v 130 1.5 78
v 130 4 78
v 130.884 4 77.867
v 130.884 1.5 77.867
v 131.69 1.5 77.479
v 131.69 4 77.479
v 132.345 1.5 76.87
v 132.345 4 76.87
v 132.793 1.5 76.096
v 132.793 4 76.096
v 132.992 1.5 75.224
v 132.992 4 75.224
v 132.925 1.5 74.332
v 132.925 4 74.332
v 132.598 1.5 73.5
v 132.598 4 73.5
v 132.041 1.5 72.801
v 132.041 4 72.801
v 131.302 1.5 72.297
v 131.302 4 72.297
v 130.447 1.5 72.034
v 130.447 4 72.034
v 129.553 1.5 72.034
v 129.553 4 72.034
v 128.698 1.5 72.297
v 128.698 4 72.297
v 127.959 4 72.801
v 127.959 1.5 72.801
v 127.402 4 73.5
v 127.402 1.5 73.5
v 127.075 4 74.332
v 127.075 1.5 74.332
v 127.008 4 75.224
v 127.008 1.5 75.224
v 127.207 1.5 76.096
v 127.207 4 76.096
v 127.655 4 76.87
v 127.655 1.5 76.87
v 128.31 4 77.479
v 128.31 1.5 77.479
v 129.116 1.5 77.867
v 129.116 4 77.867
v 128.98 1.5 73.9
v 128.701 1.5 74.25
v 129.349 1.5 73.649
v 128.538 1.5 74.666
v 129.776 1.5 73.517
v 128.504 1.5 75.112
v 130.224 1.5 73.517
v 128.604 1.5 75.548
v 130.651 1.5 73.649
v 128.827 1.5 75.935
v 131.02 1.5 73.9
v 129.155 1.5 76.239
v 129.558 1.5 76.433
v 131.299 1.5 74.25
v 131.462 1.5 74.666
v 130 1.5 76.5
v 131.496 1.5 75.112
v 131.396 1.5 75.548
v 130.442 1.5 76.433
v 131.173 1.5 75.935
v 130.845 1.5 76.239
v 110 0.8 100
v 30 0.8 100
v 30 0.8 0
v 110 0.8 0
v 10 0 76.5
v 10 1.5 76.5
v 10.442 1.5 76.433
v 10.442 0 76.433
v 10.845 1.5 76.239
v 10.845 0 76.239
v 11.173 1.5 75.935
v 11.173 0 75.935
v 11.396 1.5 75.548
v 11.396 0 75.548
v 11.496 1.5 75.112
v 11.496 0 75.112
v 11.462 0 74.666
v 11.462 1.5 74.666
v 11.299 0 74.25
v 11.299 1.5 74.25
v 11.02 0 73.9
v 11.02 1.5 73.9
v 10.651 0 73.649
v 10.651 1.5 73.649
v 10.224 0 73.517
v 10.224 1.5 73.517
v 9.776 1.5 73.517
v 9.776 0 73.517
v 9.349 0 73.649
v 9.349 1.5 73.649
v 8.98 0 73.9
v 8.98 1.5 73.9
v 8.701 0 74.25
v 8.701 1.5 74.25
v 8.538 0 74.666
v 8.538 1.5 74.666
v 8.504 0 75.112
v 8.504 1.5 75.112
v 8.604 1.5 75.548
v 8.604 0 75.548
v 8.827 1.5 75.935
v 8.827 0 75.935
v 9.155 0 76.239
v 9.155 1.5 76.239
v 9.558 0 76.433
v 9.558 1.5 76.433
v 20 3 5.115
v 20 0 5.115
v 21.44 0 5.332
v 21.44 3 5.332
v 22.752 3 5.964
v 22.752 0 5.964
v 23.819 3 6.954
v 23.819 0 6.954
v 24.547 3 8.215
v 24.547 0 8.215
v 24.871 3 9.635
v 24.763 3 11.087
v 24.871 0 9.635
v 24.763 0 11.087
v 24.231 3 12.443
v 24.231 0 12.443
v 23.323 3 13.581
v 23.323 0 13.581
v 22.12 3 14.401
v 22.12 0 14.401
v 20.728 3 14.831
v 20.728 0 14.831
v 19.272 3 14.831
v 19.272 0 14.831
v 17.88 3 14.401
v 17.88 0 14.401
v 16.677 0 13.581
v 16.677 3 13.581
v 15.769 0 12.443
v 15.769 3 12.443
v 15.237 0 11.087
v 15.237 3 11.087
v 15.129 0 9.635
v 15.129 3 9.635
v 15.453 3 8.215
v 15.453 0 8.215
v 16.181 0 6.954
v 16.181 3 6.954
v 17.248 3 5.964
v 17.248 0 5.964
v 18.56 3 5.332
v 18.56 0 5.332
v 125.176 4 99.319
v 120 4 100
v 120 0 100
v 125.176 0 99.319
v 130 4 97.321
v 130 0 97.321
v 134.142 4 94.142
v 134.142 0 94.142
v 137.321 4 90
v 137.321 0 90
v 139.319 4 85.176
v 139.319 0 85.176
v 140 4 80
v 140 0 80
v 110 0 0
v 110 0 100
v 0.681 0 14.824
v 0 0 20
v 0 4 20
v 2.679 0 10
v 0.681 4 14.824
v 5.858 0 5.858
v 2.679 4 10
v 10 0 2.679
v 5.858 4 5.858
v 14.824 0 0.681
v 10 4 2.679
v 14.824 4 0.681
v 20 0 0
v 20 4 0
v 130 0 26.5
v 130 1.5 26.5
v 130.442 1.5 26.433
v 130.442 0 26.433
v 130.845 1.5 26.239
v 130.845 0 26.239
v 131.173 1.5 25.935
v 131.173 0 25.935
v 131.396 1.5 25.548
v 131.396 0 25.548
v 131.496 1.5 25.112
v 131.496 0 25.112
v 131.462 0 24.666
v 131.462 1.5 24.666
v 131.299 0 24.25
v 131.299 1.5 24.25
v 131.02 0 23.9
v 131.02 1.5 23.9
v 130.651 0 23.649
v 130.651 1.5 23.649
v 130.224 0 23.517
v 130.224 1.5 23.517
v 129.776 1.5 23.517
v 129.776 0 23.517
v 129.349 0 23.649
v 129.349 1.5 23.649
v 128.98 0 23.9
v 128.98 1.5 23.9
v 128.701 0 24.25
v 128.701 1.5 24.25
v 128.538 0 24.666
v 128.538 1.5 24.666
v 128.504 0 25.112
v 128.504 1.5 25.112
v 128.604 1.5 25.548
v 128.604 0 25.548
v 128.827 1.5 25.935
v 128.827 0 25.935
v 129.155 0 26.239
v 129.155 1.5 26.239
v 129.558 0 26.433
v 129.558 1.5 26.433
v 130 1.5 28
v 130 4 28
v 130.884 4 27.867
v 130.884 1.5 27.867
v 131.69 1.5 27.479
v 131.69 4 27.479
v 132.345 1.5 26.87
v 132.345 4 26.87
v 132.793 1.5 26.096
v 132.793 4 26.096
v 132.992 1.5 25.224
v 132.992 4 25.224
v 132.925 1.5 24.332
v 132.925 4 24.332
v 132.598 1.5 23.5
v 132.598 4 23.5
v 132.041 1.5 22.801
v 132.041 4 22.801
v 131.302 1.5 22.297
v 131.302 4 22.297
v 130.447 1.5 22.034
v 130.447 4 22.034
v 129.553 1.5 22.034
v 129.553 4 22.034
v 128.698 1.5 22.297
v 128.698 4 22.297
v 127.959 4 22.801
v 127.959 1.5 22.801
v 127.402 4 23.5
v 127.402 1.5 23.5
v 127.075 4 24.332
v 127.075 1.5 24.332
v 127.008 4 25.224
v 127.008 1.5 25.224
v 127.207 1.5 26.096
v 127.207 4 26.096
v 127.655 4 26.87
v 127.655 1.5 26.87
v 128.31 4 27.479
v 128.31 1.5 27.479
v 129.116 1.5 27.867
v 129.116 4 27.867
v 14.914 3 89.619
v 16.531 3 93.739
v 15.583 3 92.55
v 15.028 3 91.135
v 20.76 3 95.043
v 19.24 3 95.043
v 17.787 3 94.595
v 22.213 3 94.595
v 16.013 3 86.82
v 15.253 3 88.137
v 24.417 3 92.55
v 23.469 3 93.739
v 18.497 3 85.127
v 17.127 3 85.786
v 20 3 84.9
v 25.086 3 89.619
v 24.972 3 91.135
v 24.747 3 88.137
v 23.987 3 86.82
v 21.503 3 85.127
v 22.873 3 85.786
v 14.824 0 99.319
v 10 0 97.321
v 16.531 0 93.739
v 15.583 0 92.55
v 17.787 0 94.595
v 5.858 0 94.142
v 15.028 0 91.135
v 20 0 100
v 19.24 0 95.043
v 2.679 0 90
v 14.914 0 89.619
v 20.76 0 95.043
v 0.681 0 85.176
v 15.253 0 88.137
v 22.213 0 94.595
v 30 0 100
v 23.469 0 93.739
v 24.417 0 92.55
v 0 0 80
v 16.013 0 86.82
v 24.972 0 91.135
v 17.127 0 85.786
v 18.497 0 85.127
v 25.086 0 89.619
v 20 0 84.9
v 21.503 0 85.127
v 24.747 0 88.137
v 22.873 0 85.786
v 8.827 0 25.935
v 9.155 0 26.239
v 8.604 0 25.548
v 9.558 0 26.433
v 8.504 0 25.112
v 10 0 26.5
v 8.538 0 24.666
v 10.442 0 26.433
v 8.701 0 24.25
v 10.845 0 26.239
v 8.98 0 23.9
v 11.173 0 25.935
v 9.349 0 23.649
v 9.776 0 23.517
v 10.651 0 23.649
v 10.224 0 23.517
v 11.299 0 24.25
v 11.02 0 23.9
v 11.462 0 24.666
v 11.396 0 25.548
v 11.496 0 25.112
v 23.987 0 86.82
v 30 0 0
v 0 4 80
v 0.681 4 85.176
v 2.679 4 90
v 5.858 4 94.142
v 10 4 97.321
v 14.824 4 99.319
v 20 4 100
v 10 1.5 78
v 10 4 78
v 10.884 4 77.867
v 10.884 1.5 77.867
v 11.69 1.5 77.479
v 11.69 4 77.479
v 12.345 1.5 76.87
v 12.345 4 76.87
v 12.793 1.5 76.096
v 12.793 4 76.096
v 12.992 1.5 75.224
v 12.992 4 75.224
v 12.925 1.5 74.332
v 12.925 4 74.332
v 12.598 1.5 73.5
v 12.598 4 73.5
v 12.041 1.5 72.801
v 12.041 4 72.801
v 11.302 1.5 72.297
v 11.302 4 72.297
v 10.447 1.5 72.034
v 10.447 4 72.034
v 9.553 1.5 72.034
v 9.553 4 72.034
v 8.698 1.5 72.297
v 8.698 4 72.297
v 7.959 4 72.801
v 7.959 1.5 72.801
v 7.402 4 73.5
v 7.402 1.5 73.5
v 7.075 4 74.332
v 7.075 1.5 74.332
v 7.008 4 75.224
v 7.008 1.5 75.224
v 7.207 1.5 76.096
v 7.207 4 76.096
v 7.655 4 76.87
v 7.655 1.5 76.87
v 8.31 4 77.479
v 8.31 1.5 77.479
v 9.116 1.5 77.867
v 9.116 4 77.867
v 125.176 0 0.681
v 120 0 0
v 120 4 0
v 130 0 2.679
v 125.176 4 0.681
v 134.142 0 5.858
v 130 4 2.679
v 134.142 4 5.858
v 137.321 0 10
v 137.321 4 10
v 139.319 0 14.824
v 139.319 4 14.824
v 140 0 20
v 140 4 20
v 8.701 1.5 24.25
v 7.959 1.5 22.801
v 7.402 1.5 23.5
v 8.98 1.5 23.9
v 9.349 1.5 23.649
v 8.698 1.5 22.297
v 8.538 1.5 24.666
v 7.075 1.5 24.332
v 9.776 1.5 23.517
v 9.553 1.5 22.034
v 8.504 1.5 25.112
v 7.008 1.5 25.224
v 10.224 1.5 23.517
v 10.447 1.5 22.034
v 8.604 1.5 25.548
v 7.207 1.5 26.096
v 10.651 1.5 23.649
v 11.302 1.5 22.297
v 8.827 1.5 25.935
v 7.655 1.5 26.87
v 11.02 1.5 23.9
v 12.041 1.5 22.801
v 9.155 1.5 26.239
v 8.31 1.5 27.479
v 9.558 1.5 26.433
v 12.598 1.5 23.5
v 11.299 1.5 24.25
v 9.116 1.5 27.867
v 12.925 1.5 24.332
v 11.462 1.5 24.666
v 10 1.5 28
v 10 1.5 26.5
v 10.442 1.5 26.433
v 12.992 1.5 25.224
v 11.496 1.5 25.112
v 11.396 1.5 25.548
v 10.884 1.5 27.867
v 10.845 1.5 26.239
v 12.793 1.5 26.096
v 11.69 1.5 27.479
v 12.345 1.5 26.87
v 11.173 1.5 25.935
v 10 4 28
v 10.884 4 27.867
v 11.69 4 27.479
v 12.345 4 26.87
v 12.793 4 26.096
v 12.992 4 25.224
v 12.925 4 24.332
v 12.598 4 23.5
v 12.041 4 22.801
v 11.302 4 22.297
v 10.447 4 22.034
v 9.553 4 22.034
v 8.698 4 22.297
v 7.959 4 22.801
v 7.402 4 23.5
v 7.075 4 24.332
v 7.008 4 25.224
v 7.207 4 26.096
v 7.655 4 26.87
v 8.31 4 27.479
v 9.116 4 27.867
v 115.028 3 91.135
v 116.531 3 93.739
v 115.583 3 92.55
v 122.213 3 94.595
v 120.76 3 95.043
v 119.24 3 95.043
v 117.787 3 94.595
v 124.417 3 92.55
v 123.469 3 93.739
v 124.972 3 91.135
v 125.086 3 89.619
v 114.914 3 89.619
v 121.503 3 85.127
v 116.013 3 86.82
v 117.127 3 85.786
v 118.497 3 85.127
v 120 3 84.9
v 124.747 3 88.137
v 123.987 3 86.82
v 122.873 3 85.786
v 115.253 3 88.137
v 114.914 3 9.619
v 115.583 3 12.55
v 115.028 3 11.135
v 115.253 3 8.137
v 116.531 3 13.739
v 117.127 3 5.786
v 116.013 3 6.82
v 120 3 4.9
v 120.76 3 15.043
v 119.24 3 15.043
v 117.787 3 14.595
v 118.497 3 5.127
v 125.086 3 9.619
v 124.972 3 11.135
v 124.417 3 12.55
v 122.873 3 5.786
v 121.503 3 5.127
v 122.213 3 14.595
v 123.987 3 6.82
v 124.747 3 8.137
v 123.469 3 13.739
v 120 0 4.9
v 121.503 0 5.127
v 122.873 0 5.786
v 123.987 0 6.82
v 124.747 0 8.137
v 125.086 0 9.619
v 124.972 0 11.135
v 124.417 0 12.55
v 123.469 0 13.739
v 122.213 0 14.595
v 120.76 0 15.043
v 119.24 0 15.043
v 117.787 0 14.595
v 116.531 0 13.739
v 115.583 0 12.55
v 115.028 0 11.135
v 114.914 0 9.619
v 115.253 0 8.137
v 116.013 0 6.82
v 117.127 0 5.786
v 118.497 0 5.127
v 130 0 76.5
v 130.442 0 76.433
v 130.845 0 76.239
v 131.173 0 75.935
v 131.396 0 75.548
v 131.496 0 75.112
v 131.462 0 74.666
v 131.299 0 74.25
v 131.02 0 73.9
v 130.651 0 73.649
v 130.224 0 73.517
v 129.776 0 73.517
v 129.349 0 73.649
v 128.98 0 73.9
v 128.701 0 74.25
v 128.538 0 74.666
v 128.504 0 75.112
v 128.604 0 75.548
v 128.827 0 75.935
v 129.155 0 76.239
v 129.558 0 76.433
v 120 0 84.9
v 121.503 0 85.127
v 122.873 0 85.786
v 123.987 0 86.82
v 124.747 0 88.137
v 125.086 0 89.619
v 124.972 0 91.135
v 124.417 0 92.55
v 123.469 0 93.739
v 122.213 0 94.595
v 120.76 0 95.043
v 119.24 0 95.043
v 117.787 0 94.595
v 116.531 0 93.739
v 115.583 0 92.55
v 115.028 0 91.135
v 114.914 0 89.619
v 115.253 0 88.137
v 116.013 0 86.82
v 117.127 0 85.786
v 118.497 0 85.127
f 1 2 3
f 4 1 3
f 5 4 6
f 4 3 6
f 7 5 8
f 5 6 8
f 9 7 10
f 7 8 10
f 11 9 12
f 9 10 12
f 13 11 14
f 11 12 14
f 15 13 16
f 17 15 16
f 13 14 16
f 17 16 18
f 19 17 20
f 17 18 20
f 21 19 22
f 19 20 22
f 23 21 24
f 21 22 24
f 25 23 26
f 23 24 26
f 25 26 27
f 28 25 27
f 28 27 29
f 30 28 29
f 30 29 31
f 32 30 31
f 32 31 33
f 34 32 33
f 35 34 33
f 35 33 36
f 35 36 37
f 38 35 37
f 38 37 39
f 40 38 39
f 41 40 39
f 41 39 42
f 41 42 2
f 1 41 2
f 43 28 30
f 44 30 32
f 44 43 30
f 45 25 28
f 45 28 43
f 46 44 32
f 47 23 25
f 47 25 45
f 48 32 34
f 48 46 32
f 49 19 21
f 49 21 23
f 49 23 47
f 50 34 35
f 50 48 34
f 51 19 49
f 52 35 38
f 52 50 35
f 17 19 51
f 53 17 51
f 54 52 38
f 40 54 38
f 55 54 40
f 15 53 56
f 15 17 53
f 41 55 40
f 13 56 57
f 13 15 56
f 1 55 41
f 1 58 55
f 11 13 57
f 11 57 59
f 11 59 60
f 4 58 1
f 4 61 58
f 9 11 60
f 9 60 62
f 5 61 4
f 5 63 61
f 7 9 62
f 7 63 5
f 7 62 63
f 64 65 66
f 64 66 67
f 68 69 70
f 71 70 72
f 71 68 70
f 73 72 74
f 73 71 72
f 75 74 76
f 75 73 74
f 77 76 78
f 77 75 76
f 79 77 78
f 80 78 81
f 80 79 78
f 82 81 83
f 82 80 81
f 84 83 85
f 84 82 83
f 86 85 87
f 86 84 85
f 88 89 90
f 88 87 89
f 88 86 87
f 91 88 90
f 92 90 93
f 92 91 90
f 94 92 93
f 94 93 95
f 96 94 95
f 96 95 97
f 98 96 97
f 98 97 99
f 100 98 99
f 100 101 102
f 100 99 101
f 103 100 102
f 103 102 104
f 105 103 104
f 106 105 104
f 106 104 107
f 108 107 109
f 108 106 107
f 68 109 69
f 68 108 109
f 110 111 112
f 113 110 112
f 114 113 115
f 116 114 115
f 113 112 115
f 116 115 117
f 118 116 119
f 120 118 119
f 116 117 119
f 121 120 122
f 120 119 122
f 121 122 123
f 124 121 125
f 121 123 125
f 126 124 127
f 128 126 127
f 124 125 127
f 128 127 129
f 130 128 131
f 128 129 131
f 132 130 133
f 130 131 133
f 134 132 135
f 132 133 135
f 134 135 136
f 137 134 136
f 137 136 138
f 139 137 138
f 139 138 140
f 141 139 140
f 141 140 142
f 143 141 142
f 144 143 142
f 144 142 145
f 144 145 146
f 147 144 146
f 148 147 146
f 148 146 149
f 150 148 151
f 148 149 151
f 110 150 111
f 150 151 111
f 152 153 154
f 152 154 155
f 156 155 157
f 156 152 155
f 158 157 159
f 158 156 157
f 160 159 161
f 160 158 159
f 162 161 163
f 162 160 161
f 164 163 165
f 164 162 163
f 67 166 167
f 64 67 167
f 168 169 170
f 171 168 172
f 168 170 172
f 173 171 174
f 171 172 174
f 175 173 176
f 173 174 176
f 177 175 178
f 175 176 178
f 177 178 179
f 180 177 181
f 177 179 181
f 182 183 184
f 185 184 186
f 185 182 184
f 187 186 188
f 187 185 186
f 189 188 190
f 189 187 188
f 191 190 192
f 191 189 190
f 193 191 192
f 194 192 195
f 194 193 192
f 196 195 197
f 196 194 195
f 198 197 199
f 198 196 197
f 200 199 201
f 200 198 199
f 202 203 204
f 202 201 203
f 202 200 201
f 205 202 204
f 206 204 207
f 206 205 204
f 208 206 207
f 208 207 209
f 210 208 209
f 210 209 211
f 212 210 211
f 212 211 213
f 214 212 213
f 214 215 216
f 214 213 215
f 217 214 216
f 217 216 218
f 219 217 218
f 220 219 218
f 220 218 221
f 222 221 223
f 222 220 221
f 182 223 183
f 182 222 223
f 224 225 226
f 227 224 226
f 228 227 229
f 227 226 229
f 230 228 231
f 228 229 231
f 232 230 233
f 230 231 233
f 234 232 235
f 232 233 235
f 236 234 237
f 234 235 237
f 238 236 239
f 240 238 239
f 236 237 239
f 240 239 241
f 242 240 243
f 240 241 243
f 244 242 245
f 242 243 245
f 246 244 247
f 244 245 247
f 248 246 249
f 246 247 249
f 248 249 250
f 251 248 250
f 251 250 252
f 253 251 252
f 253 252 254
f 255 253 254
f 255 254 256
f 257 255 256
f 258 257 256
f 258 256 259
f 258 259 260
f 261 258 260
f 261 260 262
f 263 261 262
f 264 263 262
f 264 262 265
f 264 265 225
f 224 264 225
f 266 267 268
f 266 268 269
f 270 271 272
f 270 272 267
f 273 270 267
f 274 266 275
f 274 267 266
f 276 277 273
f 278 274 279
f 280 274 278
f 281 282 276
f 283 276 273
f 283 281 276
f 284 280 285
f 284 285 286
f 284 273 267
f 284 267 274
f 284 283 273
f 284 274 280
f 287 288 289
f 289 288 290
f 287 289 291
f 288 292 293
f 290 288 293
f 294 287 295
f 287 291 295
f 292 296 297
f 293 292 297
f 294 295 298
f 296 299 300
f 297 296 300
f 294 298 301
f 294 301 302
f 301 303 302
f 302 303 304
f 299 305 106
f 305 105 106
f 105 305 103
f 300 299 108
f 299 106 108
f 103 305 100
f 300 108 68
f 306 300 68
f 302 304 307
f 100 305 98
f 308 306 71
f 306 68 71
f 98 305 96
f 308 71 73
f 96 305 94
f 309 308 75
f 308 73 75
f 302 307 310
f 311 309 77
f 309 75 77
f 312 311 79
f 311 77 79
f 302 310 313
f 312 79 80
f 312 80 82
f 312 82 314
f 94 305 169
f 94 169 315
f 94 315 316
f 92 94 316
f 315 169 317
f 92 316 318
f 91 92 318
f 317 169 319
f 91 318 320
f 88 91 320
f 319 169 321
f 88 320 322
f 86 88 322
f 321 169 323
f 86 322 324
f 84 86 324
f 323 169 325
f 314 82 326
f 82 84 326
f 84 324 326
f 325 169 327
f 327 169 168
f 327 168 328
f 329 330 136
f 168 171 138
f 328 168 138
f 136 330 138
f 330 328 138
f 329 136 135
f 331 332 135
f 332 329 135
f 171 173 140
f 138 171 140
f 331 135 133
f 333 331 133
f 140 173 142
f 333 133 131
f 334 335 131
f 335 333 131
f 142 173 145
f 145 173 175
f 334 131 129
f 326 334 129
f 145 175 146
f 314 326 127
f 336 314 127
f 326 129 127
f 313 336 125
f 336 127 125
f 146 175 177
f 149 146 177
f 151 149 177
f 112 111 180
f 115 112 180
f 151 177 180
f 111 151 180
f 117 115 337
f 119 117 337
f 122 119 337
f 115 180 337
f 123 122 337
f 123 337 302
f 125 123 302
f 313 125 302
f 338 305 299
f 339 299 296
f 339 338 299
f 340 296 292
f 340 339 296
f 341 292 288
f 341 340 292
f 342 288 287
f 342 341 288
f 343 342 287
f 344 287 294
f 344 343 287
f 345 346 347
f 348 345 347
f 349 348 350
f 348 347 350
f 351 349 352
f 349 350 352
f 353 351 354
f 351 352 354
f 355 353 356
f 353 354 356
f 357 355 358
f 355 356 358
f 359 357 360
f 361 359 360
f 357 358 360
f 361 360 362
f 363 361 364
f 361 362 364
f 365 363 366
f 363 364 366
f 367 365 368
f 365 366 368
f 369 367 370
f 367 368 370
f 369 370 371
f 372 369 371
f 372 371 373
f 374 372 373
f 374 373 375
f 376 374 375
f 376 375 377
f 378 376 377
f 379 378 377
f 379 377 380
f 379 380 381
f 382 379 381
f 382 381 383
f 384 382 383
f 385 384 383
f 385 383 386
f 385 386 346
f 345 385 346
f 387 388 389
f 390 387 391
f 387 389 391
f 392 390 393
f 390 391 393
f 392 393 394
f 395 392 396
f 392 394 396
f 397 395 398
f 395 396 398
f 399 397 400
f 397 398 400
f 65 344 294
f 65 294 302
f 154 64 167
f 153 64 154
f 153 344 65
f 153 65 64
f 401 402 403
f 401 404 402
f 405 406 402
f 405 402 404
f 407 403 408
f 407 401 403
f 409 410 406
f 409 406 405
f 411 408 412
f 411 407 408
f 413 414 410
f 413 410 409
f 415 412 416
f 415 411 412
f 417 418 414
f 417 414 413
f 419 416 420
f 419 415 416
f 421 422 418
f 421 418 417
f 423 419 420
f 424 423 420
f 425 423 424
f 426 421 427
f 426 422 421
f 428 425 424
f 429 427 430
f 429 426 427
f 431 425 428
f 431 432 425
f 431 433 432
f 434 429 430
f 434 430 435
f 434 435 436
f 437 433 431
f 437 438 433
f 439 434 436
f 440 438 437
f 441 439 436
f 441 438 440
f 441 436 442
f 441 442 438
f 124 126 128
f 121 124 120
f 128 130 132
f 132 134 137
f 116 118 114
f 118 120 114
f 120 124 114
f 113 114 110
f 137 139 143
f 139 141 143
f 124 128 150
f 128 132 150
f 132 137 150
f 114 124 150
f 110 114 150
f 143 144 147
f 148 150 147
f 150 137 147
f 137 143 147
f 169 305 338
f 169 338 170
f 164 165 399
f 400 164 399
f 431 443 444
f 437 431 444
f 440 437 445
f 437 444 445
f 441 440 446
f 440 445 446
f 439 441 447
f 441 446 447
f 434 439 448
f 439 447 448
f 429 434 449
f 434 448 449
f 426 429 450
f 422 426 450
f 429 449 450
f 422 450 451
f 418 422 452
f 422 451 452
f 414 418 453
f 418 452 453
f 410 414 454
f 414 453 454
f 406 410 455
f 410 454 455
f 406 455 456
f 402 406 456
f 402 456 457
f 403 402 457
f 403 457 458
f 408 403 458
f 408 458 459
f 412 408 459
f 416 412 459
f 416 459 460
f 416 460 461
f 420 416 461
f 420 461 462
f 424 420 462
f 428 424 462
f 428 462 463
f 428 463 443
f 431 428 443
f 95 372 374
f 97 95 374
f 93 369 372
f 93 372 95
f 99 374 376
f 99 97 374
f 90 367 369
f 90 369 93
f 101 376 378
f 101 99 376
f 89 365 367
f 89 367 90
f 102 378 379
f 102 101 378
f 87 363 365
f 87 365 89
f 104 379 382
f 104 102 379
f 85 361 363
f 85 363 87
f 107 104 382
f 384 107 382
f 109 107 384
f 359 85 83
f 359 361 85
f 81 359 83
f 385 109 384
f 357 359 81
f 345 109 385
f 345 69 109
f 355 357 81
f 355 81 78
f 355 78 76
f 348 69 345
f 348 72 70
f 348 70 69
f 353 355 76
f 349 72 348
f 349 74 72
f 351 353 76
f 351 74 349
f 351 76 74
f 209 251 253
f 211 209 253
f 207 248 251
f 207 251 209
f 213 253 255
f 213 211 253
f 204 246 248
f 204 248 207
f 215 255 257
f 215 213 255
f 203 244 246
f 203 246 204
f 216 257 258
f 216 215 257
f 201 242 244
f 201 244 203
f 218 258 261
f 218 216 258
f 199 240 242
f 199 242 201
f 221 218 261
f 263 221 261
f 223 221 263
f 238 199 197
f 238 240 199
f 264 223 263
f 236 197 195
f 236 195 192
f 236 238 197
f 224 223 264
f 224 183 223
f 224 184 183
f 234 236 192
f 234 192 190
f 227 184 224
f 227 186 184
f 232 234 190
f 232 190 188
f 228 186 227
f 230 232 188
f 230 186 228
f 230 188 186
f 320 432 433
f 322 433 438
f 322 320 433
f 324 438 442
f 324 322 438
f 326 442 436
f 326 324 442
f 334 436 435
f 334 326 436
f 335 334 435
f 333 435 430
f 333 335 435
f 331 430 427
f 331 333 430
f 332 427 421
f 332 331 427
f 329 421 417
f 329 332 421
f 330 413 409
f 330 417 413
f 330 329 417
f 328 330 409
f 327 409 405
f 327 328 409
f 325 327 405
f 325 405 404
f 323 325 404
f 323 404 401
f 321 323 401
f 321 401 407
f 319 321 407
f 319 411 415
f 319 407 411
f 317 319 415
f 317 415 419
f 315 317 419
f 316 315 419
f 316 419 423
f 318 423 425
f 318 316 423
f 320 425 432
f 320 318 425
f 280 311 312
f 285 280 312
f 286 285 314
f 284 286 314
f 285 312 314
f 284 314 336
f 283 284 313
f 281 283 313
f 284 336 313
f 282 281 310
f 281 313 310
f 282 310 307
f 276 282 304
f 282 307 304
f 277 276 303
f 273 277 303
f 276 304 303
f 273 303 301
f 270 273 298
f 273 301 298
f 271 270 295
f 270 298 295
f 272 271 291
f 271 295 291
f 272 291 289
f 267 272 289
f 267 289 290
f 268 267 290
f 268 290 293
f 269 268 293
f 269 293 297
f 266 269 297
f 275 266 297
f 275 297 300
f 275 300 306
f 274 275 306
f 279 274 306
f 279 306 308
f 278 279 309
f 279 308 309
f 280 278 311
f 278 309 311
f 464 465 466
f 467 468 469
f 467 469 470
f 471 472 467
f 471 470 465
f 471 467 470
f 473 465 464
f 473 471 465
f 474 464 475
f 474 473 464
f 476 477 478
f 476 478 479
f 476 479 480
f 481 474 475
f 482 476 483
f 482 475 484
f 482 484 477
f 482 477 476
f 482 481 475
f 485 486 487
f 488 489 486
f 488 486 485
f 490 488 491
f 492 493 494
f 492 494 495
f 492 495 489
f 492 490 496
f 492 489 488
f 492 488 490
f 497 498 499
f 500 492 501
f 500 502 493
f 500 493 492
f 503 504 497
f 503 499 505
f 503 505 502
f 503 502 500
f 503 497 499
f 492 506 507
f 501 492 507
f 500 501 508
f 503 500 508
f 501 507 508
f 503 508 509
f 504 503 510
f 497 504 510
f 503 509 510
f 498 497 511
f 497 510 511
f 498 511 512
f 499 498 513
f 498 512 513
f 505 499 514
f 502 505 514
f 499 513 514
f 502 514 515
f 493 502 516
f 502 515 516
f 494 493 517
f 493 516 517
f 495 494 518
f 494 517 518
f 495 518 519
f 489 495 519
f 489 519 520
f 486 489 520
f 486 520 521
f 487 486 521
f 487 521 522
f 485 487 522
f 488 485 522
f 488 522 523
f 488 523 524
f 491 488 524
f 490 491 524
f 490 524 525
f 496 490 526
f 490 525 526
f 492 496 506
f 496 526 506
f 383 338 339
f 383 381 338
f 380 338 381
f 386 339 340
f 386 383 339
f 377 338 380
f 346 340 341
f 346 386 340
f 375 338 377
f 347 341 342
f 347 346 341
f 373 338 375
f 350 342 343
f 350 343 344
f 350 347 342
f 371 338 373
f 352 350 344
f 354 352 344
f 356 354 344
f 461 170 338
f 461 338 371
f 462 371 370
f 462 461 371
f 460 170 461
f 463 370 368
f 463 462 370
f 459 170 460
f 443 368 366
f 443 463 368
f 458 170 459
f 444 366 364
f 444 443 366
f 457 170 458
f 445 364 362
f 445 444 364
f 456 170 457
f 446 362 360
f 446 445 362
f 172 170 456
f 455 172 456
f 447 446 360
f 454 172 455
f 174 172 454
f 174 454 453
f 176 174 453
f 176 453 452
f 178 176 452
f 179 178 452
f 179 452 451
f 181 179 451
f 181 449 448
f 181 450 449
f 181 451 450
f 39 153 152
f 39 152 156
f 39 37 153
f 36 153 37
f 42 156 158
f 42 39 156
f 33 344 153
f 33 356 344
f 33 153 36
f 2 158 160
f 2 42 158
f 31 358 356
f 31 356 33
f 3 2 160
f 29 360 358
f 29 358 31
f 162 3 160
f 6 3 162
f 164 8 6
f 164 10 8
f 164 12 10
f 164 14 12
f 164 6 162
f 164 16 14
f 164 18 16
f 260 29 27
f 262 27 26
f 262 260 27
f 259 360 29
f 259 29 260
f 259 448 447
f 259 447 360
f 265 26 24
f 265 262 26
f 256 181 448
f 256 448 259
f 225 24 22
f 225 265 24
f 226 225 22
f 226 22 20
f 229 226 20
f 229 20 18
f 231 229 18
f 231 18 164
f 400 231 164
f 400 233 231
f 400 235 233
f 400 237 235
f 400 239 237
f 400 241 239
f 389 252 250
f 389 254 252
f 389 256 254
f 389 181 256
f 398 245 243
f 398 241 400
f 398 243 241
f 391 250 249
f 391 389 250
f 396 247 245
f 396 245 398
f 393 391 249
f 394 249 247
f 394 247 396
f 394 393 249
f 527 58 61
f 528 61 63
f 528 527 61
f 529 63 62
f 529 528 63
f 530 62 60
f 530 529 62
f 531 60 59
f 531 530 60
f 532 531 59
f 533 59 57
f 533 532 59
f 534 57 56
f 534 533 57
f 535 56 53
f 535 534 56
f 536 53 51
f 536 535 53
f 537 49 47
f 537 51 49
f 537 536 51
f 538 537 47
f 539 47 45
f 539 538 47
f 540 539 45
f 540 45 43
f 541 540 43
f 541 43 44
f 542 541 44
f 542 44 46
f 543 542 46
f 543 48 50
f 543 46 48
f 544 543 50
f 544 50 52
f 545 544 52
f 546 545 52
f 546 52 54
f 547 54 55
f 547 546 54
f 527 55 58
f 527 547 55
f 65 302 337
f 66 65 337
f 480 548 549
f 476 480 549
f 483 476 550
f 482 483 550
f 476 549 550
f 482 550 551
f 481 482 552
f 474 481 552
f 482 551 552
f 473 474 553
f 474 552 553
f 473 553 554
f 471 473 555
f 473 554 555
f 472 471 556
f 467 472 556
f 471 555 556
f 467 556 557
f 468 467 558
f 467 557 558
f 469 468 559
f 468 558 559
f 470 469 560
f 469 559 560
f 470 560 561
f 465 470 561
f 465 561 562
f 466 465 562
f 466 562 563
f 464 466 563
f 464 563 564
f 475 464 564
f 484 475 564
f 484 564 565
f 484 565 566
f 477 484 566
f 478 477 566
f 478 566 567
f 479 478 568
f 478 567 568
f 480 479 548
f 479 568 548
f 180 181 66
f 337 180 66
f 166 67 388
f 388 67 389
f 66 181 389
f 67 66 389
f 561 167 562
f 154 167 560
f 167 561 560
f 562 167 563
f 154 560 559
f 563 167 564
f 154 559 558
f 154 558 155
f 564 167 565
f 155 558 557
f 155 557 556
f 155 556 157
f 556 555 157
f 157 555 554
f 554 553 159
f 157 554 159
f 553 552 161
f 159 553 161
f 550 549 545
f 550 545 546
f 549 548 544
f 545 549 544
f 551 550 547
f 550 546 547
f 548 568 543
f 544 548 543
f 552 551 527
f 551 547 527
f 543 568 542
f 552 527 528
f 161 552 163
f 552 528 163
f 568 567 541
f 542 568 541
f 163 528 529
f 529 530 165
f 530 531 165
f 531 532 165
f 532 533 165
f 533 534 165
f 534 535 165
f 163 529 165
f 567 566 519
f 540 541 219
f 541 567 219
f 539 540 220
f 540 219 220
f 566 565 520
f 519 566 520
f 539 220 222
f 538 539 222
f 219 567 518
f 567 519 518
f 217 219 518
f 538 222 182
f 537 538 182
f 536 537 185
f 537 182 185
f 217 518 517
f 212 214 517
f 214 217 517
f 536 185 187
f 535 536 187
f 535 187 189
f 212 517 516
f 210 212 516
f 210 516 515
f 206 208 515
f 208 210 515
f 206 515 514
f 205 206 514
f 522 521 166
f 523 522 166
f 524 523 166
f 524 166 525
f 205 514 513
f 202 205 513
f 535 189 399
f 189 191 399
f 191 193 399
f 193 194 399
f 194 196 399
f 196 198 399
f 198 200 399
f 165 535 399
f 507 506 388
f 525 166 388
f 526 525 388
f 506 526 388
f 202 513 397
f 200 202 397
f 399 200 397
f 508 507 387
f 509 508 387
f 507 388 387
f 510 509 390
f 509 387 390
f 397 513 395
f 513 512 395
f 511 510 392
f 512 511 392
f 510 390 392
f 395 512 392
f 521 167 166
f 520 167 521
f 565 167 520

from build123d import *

# Parameters (mm, degrees)
SKETCH_2_W          = 140
SKETCH_2_H          = 100
SKETCH_2_R          = 1.5
EXTRUDE_1_DEPTH     = 5
FILLET_1_R          = 20
SKETCH_3_R          = 3
CUT_EXTRUDE_1_DEPTH = 3
CUT_EXTRUDE_2_DEPTH = 0.9
SKETCH_5_R          = 2.5
CUT_EXTRUDE_3_DEPTH = 4
SKETCH_6_W          = 157.651833544
SKETCH_6_H          = 102.032930916
CUT_EXTRUDE_4_DEPTH = 1
EXTRUDE_START       = -1
SKETCH_7_R          = 2.5
EXTRUDE_2_DEPTH     = 1
SKETCH_8_R          = 3
CUT_EXTRUDE_5_DEPTH = 0.5
SKETCH_9_R          = 5.1
SKETCH_9_R_2        = 4.885066143
CUT_EXTRUDE_6_DEPTH = 3
SKETCH_10_W         = 80
SKETCH_10_H         = 100
EXTRUDE_3_DEPTH     = 0.1


with BuildPart() as part:
    # 草图2 → 凸台-拉伸1 (new body)
    with BuildSketch(Plane(origin=(0, 0, 0), x_dir=(1, 0, 0), z_dir=(0, 1, 0))):
        with Locations((70, -50)):
            Rectangle(SKETCH_2_W, SKETCH_2_H)
        with Locations(Location((10, -25, 0), (0, 0, 270))):
            Circle(SKETCH_2_R, mode=Mode.SUBTRACT)
        with Locations(Location((10, -75, 0), (0, 0, 270))):
            Circle(SKETCH_2_R, mode=Mode.SUBTRACT)
        with Locations(Location((130, -75, 0), (0, 0, 270))):
            Circle(SKETCH_2_R, mode=Mode.SUBTRACT)
        with Locations(Location((130, -25, 0), (0, 0, 270))):
            Circle(SKETCH_2_R, mode=Mode.SUBTRACT)
    extrude(amount=EXTRUDE_1_DEPTH)

    # 圆角1
    fillet_1_edges = [part.edges().sort_by_distance(p)[0] for p in [
        (140, 2.5, 100),
        (0, 2.5, 100),
        (0, 2.5, 0),
        (140, 2.5, 0),
    ]]
    fillet(fillet_1_edges, radius=FILLET_1_R)

    # 草图3 → 切除-拉伸1 (cut)
    with BuildSketch(Plane(origin=(0, 5, 0), x_dir=(1, 0, 0), z_dir=(0, 1, 0))):
        with Locations(Location((10, -25, 0), (0, 0, 270))):
            Circle(SKETCH_3_R)
        with Locations(Location((10, -75, 0), (0, 0, 270))):
            Circle(SKETCH_3_R)
        with Locations(Location((130, -25, 0), (0, 0, 270))):
            Circle(SKETCH_3_R)
        with Locations(Location((130, -75, 0), (0, 0, 270))):
            Circle(SKETCH_3_R)
    extrude(amount=-CUT_EXTRUDE_1_DEPTH, mode=Mode.SUBTRACT)

    # 草图4 → 切除-拉伸2 (cut)
    with BuildSketch(Plane.XZ):
        Polygon((30, 100), (110, 100), (110, 50), (110, 0), (30, 0), (30, 50), align=None)
    extrude(amount=-CUT_EXTRUDE_2_DEPTH, mode=Mode.SUBTRACT)

    # 草图5 → 切除-拉伸3 (cut)
    with BuildSketch(Plane.XZ):
        with Locations(Location((20, 90, 0), (0, 0, 270))):
            Circle(SKETCH_5_R)
        with Locations(Location((120, 90, 0), (0, 0, 270))):
            Circle(SKETCH_5_R)
        with Locations(Location((120, 10, 0), (0, 0, 270))):
            Circle(SKETCH_5_R)
        with Locations(Location((20, 10, 0), (0, 0, 270))):
            Circle(SKETCH_5_R)
    extrude(amount=-CUT_EXTRUDE_3_DEPTH, mode=Mode.SUBTRACT)

    # 草图6 → 切除-拉伸4 (cut)
    with BuildSketch(Plane(origin=(0, 5, 0), x_dir=(1, 0, 0), z_dir=(0, 1, 0))):
        with Locations((78.825916772, -51.016465458)):
            Rectangle(SKETCH_6_W, SKETCH_6_H)
    extrude(amount=-CUT_EXTRUDE_4_DEPTH, mode=Mode.SUBTRACT)

    # 草图7 → 凸台-拉伸2 (add)
    with BuildSketch(Plane(origin=(0, 4, 0), x_dir=(1, 0, 0), z_dir=(0, 1, 0)).offset(EXTRUDE_START)):
        with Locations(Location((20, -10, 0), (0, 0, 90))):
            Circle(SKETCH_7_R)
        with Locations(Location((120, -10, 0), (0, 0, 90))):
            Circle(SKETCH_7_R)
        with Locations(Location((120, -90, 0), (0, 0, 90))):
            Circle(SKETCH_7_R)
        with Locations(Location((20, -90, 0), (0, 0, 90))):
            Circle(SKETCH_7_R)
    extrude(amount=EXTRUDE_2_DEPTH)

    # 草图8 → 切除-拉伸5 (cut)
    with BuildSketch(Plane(origin=(0, 2, 0), x_dir=(1, 0, 0), z_dir=(0, 1, 0))):
        with Locations(Location((10, -25, 0), (0, 0, 270))):
            Circle(SKETCH_8_R)
        with Locations(Location((10, -75, 0), (0, 0, 270))):
            Circle(SKETCH_8_R)
        with Locations(Location((130, -75, 0), (0, 0, 270))):
            Circle(SKETCH_8_R)
        with Locations(Location((130, -25, 0), (0, 0, 270))):
            Circle(SKETCH_8_R)
    extrude(amount=-CUT_EXTRUDE_5_DEPTH, mode=Mode.SUBTRACT)

    # 草图9 → 切除-拉伸6 (cut)
    with BuildSketch(Plane.XZ):
        with Locations(Location((20, 90, 0), (0, 0, 270))):
            Circle(SKETCH_9_R)
        with Locations(Location((120, 90, 0), (0, 0, 270))):
            Circle(SKETCH_9_R)
        with Locations(Location((20, 10, 0), (0, 0, 270))):
            Circle(SKETCH_9_R_2)
        with Locations(Location((120, 10, 0), (0, 0, 270))):
            Circle(SKETCH_9_R)
    extrude(amount=-CUT_EXTRUDE_6_DEPTH, mode=Mode.SUBTRACT)

    # 草图10 → 凸台-拉伸3 (add)
    with BuildSketch(Plane.XZ.offset(-0.9)):
        with Locations((70, 50)):
            Rectangle(SKETCH_10_W, SKETCH_10_H)
    extrude(amount=EXTRUDE_3_DEPTH)


solid = part.part
